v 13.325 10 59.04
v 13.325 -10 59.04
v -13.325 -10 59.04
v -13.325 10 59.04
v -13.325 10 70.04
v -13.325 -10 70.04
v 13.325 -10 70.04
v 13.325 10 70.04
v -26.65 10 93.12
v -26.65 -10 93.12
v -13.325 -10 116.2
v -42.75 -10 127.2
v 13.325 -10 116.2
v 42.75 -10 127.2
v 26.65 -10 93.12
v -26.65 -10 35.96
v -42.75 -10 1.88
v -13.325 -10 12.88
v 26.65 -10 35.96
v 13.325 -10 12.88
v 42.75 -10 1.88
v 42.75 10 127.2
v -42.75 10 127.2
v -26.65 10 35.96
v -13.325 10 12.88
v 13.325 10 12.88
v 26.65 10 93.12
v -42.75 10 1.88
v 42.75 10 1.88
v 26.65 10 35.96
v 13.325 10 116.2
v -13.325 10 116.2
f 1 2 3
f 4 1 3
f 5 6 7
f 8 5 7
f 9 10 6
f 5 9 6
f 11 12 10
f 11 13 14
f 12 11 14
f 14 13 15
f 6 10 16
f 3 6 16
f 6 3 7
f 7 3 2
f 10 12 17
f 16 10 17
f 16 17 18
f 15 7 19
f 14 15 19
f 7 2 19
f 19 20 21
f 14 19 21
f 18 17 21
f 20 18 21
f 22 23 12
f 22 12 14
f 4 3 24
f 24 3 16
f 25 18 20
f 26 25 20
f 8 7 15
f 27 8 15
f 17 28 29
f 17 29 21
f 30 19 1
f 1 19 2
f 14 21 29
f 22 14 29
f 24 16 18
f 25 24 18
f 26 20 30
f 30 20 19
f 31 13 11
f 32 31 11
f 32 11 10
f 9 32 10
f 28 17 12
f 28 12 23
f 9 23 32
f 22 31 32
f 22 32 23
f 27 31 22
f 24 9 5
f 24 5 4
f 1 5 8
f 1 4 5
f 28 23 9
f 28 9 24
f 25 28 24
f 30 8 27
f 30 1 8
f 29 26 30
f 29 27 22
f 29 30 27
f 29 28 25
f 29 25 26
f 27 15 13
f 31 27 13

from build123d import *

# Parameters (mm, degrees)
SKETCH_W        = 85.5
SKETCH_H        = 20
PAD_DEPTH       = 127.2
PAD_FACE5_W     = 20
PAD_FACE5_H     = 85.5
POCKET_DEPTH    = 1.88
POCKET001_DEPTH = 20.001


with BuildPart() as part:
    # Sketch → Pad (new body)
    with BuildSketch(Plane.XY):
        Rectangle(SKETCH_W, SKETCH_H)
    extrude(amount=PAD_DEPTH)

    # Pad Face5 → Pocket (cut)
    with BuildSketch(Plane(origin=(0, 0, 0), x_dir=(0, -1, 0), z_dir=(0, 0, -1))):
        Rectangle(PAD_FACE5_W, PAD_FACE5_H)
    extrude(amount=-POCKET_DEPTH, mode=Mode.SUBTRACT)

    # Sketch001 (on Face1 of Pocket) → Pocket001 (cut, through all)
    with BuildSketch(Plane.XZ.offset(10)):
        Polygon((13.325244, 70.04), (26.650488, 93.12), (13.325244, 116.2), (-13.325244, 116.2), (-26.650488, 93.12), (-13.325244, 70.04), align=None)
        Polygon((13.325244, 12.88), (26.650488, 35.96), (13.325244, 59.04), (-13.325244, 59.04), (-26.650488, 35.96), (-13.325244, 12.88), align=None)
    extrude(amount=-POCKET001_DEPTH, mode=Mode.SUBTRACT)


solid = part.part
